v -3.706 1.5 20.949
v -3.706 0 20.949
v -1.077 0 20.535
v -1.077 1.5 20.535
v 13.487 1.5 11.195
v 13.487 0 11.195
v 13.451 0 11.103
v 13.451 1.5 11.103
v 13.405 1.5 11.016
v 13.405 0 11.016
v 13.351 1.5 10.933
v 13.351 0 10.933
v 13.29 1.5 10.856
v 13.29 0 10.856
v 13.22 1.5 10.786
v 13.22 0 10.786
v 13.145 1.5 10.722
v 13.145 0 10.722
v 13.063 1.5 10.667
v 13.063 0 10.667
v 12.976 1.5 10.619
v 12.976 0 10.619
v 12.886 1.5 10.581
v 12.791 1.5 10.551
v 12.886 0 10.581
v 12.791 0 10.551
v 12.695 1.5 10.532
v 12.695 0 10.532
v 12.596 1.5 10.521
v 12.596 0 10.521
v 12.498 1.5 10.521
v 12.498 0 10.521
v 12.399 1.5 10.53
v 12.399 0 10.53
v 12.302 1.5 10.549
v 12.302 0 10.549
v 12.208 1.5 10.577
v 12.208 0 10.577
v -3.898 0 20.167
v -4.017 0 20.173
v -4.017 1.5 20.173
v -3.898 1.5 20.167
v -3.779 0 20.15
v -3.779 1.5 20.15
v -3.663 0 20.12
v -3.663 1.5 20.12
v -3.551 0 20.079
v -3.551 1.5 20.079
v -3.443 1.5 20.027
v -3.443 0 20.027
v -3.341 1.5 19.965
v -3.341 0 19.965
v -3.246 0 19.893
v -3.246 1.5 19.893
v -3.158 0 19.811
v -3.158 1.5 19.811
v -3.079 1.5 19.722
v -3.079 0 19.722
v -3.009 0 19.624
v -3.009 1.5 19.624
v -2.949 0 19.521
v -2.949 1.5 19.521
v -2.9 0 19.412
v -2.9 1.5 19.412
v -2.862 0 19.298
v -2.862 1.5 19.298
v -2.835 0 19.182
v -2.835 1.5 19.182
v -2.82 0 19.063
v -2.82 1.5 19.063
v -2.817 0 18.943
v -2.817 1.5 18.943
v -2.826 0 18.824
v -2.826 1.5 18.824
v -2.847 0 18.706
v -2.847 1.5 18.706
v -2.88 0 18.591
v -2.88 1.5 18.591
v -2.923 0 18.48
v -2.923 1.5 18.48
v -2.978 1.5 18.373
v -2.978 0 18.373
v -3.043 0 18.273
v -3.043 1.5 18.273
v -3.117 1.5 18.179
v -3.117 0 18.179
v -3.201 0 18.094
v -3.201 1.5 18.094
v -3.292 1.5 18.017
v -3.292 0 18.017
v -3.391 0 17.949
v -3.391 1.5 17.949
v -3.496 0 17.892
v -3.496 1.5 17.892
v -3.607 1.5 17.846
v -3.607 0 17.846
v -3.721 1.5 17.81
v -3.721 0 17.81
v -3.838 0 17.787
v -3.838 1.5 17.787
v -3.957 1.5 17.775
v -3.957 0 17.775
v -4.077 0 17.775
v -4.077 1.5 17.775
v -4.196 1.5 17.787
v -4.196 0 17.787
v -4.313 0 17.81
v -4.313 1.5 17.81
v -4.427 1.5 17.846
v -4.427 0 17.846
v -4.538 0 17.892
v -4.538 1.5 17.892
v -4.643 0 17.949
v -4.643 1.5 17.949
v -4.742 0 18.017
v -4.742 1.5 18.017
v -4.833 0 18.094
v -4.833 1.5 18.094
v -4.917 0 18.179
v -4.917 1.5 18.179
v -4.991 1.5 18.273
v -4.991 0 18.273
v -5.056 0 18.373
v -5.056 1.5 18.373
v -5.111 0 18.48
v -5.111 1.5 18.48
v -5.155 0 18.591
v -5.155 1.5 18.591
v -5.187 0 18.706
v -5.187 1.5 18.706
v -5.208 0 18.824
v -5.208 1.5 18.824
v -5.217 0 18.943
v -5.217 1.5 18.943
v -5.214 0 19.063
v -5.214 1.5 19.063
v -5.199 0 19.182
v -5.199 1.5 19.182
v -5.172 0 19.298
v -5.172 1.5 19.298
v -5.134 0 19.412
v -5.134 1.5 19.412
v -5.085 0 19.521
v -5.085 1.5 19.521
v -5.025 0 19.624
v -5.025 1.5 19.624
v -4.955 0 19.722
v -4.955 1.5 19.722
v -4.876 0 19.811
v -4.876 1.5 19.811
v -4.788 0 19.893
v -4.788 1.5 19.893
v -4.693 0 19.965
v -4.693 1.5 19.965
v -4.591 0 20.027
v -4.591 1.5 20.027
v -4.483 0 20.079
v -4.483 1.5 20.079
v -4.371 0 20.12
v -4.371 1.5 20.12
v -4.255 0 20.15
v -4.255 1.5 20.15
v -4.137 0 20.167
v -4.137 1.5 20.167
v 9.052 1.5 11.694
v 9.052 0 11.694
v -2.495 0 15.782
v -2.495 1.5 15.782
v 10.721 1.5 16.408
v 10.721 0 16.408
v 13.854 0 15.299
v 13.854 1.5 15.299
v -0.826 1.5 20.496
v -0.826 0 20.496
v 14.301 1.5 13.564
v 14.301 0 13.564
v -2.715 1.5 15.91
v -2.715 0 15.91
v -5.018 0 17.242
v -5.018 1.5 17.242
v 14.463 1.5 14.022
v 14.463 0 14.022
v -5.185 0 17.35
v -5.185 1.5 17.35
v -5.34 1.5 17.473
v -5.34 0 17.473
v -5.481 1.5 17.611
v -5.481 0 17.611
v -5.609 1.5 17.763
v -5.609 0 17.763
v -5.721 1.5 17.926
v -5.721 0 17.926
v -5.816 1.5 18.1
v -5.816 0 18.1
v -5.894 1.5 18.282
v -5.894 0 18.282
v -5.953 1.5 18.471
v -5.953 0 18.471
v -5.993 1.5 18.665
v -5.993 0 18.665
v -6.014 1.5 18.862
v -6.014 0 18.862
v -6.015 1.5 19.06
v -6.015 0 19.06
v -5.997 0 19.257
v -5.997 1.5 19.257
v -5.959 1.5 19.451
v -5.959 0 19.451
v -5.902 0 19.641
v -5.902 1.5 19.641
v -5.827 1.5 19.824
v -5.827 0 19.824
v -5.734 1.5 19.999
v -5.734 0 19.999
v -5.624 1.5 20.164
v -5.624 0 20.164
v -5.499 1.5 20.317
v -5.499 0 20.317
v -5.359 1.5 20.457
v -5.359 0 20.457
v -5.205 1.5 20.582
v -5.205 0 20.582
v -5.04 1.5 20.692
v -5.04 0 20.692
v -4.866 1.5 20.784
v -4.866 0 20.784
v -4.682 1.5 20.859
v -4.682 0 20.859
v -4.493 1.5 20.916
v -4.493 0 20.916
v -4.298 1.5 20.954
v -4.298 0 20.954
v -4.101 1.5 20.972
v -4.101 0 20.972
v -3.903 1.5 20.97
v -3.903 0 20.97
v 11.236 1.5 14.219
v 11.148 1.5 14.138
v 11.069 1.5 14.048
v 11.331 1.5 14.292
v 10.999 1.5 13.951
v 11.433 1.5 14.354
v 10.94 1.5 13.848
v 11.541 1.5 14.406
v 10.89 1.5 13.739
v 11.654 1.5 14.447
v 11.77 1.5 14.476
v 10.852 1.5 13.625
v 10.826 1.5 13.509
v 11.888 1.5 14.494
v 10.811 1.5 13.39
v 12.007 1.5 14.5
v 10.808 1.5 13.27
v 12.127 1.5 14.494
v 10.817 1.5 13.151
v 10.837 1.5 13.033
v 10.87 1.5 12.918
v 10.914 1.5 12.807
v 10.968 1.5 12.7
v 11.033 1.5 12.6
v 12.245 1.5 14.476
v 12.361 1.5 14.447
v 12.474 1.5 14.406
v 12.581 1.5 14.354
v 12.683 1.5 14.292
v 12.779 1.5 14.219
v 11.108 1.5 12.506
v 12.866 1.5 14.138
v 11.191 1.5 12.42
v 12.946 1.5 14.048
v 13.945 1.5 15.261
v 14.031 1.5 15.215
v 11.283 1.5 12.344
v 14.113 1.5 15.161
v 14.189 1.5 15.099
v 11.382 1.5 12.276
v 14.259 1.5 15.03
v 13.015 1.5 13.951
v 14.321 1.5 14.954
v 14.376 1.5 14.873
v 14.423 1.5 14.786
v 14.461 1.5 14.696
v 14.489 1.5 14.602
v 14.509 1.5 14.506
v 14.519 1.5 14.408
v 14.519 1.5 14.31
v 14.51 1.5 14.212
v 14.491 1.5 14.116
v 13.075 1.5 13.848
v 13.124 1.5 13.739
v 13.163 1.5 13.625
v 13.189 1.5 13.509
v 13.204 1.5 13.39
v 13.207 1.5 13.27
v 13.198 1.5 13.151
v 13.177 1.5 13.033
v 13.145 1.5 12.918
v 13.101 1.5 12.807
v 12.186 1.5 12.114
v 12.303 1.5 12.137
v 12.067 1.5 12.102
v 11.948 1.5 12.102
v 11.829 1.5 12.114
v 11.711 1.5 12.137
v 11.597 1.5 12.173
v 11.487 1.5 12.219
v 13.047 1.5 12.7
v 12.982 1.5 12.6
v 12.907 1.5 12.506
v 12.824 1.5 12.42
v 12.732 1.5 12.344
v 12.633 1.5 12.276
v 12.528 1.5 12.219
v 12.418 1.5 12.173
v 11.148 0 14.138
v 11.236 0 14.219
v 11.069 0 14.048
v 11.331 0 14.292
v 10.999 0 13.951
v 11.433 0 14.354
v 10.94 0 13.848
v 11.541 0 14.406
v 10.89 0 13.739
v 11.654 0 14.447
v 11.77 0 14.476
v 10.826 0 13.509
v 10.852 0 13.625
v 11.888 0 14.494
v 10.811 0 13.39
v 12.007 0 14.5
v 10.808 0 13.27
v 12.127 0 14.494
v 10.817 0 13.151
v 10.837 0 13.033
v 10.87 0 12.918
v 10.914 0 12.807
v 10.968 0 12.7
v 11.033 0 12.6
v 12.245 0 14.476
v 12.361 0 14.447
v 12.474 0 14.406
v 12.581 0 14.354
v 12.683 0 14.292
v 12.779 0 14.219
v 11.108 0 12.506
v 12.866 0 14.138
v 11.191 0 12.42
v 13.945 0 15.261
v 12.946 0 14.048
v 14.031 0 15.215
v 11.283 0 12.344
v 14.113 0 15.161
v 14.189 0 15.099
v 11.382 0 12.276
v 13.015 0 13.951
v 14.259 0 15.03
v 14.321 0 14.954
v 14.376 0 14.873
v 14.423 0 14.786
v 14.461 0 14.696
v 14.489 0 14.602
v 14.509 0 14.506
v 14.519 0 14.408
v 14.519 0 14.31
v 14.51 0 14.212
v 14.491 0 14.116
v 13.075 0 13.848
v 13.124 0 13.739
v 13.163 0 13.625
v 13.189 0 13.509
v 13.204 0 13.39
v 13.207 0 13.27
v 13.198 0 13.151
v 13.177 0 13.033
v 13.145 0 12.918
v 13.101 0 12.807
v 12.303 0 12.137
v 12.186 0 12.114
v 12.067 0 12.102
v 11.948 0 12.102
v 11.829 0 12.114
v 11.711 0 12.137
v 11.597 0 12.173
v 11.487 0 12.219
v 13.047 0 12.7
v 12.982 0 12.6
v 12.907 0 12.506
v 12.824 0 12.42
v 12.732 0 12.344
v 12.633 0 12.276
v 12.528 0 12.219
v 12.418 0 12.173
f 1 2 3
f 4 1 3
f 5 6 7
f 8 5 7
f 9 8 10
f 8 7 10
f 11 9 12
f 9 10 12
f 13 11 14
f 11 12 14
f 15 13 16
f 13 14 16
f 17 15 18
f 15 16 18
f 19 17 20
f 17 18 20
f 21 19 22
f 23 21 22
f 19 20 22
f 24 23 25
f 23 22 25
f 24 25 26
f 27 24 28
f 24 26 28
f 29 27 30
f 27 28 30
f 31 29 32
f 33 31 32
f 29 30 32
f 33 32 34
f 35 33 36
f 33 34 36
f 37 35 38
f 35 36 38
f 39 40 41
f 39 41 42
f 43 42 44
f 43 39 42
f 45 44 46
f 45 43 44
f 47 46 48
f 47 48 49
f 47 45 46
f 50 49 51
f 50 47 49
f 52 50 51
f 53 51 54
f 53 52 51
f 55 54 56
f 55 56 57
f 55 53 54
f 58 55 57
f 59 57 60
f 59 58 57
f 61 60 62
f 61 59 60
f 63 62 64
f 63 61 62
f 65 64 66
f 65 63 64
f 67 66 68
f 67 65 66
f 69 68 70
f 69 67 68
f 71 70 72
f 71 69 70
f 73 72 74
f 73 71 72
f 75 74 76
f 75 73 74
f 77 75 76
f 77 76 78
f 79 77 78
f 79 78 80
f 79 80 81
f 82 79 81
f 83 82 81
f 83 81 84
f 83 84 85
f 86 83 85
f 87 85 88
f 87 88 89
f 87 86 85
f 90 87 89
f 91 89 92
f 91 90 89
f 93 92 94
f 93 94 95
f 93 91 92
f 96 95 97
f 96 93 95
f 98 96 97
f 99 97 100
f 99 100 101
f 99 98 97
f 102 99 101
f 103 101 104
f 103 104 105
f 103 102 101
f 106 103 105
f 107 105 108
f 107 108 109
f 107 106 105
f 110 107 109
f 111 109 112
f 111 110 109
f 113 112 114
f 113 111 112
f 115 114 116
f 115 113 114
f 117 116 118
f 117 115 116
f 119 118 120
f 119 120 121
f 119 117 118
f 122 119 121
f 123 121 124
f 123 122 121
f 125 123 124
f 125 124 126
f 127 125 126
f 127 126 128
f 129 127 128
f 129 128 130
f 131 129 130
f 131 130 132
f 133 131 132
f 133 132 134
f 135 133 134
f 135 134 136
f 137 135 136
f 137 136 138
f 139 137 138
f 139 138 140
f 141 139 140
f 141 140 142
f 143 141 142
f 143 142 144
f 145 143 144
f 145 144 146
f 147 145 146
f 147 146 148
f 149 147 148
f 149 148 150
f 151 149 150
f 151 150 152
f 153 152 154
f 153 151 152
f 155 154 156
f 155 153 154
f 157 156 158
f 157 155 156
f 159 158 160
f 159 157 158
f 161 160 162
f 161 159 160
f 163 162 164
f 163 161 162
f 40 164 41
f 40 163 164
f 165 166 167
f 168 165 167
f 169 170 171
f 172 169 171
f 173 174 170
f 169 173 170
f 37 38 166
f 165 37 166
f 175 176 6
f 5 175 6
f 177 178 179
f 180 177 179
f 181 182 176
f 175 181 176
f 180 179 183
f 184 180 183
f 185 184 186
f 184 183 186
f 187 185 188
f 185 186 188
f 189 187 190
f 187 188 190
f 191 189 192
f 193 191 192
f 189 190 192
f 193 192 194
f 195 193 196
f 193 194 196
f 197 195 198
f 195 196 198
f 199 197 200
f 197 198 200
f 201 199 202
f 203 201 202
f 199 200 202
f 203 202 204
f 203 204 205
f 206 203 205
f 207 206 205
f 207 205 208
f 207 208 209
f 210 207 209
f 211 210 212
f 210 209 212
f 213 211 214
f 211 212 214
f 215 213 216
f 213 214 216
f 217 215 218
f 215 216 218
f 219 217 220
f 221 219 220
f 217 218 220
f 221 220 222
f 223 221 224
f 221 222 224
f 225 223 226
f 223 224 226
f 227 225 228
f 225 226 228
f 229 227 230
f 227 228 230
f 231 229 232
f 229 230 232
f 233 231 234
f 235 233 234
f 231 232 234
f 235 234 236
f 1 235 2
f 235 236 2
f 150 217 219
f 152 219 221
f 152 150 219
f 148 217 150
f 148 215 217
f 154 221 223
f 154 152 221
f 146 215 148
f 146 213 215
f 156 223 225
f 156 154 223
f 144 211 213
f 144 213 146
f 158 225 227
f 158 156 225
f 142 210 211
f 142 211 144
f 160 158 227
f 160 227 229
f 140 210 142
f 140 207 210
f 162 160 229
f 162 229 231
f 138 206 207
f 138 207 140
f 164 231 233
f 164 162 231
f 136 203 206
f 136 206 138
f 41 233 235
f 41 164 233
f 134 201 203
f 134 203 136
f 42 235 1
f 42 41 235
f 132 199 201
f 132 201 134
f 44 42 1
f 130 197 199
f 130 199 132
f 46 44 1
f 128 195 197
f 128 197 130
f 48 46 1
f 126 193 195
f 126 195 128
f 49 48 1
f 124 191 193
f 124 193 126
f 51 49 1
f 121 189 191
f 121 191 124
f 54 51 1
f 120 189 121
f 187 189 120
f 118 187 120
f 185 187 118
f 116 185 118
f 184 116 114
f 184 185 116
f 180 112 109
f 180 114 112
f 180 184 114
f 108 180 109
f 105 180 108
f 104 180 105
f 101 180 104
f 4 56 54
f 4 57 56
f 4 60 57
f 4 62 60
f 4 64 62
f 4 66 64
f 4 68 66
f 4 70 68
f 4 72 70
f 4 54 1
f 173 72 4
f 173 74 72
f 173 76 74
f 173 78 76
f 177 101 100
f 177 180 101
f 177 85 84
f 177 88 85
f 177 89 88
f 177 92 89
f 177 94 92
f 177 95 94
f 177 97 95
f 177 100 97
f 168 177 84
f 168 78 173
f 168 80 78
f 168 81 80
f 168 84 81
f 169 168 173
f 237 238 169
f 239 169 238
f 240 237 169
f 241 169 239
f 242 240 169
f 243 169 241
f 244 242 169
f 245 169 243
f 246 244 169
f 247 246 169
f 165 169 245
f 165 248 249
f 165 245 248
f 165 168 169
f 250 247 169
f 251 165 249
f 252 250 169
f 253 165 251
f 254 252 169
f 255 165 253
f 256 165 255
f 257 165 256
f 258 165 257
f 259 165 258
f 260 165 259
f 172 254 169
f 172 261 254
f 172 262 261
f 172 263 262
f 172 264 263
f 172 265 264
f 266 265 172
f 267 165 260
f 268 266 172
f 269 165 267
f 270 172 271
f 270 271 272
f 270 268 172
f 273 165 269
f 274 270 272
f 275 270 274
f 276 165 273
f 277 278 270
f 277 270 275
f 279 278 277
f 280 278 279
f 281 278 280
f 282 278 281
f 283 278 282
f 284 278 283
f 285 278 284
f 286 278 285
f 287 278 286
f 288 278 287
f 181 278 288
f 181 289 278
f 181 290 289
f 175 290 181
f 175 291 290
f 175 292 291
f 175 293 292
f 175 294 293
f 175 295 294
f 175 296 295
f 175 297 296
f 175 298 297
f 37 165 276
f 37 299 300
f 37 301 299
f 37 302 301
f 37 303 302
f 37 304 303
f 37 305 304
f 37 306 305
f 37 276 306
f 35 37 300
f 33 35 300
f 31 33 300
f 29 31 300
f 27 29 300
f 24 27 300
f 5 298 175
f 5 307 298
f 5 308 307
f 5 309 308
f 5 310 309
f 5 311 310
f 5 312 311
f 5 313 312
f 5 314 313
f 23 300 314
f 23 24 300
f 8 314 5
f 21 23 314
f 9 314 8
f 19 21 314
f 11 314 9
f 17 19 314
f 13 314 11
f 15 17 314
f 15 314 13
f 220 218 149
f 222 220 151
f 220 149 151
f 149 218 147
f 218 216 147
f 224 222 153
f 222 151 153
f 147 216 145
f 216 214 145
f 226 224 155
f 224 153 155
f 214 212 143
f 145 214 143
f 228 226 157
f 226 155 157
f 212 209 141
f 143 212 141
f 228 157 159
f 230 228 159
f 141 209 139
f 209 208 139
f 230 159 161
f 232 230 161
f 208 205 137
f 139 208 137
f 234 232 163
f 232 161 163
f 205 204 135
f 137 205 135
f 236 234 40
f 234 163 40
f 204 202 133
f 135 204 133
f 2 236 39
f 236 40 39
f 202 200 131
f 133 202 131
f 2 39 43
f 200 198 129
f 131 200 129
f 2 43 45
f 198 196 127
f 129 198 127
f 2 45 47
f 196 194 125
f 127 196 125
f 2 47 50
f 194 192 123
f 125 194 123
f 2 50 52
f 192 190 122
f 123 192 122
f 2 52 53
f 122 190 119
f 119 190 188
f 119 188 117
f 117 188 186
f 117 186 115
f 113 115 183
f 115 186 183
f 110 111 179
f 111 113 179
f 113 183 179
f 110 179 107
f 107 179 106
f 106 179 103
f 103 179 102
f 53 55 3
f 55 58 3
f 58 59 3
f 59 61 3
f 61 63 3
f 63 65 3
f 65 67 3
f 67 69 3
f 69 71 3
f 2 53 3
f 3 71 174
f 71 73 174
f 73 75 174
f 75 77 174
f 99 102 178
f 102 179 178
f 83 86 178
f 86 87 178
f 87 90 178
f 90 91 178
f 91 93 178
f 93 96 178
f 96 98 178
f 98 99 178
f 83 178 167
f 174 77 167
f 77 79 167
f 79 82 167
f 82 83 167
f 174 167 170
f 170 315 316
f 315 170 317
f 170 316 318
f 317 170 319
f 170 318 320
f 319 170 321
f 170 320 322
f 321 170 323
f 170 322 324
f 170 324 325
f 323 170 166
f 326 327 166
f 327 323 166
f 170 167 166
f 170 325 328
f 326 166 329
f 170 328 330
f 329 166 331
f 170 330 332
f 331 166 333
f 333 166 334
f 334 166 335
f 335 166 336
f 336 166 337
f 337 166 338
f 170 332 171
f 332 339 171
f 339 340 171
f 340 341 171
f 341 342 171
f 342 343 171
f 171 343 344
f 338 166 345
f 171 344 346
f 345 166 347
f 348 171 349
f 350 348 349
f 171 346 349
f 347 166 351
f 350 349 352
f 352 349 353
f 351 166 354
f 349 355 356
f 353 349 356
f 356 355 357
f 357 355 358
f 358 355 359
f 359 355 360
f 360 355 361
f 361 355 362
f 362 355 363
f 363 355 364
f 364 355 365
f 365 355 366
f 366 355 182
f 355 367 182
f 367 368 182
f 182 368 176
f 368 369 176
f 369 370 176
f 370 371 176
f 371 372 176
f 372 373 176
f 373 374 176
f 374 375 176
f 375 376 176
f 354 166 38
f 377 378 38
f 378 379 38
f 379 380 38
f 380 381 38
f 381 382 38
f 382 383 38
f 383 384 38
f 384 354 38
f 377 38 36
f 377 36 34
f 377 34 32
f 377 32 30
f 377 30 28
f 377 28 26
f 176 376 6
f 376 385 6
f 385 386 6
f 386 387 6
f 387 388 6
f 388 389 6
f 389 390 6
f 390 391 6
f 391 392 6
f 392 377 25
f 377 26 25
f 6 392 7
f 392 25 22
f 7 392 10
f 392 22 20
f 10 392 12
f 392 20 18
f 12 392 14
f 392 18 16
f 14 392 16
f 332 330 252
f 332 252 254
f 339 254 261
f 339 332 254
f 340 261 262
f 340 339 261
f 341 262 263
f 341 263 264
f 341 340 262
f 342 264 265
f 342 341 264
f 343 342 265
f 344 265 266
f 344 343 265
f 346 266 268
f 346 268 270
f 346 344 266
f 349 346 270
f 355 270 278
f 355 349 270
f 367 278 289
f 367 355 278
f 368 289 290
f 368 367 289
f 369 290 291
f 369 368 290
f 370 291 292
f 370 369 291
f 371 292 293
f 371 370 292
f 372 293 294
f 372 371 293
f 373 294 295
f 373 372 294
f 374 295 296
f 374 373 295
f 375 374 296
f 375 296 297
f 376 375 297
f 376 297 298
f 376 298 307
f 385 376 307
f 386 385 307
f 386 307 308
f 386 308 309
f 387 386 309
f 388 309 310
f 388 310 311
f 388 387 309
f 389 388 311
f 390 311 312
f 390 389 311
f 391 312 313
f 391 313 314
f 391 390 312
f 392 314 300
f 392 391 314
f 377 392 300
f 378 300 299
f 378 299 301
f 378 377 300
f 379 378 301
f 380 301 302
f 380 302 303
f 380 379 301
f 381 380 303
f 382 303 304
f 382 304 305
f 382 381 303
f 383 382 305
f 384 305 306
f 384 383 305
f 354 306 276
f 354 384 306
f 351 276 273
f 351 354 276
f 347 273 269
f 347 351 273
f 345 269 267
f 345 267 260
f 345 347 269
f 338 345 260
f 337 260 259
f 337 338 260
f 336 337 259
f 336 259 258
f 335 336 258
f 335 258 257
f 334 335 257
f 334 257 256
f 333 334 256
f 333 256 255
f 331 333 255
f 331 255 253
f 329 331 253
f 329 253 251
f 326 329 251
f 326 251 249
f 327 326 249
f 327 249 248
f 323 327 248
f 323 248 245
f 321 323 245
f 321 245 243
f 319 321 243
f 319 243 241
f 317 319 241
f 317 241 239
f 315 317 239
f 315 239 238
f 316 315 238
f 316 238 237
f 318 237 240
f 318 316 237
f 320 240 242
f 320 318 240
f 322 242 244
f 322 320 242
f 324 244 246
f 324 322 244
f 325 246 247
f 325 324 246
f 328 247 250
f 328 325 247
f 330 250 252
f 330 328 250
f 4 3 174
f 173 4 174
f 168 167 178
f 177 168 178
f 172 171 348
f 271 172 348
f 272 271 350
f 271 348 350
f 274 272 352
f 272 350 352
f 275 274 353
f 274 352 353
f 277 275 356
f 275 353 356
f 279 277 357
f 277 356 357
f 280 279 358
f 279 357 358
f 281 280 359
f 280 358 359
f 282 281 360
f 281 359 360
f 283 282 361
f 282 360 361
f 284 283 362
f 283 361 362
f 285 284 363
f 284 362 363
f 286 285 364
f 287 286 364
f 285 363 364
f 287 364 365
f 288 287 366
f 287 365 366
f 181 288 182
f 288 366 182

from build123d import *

# Parameters (mm, degrees)
SKETCH3_R           = 1
BOSS_EXTRUDE2_DEPTH = 1.5
MOVE_FACE1_BY       = 0.2
MOVE_FACE1_2_BY     = 0.2


with BuildPart() as part:
    # Sketch3 → Boss-Extrude2 (new body)
    with BuildSketch(Plane(origin=(0, 0, 0), x_dir=(1, 0, 0), z_dir=(0, 1, 0))):
        with BuildLine():
            Line((9.052045009, -11.69440211), (-2.494704275, -15.782345478))
            Line((-2.494704275, -15.782345478), (-2.714831854, -15.909670913))
            Line((-2.714831854, -15.909670913), (-5.018414472, -17.242101226))
            ThreePointArc((-5.018414472, -17.242101226), (-5.90236336, -19.640824396), (-3.706036939, -20.949024969))
            Line((-3.706036939, -20.949024969), (-1.077229318, -20.535220782))
            Line((-1.077229318, -20.535220782), (-0.82602363, -20.495678153))
            Line((-0.82602363, -20.495678153), (10.720725655, -16.407734785))
            Line((10.720725655, -16.407734785), (13.853836403, -15.298506639))
            ThreePointArc((13.853836403, -15.298506639), (14.422653253, -14.786418923), (14.462766809, -14.022103975))
            Line((14.462766809, -14.022103975), (14.300666867, -13.564238683))
            Line((14.300666867, -13.564238683), (13.487374274, -11.195126647))
            ThreePointArc((13.487374274, -11.195126647), (12.976450881, -10.619337061), (12.207817887, -10.577150797))
            Line((12.207817887, -10.577150797), (9.052045009, -11.69440211))
        make_face()
        with Locations(Location((-4.01703029, -18.973352138, 0), (0, 0, 270))):
            Circle(SKETCH3_R, mode=Mode.SUBTRACT)
        with Locations(Location((12.007385036, -13.300162157, 0), (0, 0, 270))):
            Circle(SKETCH3_R, mode=Mode.SUBTRACT)
    extrude(amount=BOSS_EXTRUDE2_DEPTH)

    # Move Face1: a curved face moved inward by 0.2
    add(Solid.thicken(part.faces().sort_by_distance((12.007385036, 0.75, 12.300162157))[0], -MOVE_FACE1_BY), mode=Mode.SUBTRACT)

    # Move Face1 2: a curved face moved inward by 0.2
    add(Solid.thicken(part.faces().sort_by_distance((-4.01703029, 0.75, 17.973352138))[0], -MOVE_FACE1_2_BY), mode=Mode.SUBTRACT)


solid = part.part
